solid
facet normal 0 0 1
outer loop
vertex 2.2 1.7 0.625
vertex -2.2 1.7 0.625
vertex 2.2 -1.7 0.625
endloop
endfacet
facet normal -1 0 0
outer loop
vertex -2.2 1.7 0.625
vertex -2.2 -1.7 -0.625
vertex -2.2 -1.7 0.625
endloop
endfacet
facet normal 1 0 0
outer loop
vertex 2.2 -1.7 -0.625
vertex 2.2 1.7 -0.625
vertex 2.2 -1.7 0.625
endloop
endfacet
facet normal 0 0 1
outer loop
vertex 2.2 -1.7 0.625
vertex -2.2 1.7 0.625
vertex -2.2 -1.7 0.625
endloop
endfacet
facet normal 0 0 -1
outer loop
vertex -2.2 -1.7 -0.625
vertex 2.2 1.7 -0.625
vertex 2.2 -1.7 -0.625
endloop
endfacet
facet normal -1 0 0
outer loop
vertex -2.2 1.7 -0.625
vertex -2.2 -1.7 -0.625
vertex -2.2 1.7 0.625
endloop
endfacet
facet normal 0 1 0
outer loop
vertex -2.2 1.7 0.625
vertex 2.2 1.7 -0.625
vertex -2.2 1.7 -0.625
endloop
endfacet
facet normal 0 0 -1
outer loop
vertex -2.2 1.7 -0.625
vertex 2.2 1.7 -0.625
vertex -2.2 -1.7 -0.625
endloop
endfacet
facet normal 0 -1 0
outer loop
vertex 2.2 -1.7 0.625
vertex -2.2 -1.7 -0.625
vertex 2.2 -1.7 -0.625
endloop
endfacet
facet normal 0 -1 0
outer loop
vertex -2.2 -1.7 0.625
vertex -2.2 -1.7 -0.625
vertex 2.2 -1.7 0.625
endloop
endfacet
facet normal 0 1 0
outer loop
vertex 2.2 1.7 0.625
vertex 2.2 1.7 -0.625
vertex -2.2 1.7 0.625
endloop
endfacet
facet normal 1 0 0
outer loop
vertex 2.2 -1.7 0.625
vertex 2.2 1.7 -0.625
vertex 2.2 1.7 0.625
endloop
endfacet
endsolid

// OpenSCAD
$fn = 64;

module smd(size = [4.90, 3.90, 1.25]) {
    eps = 0.01;
    sx = max(size[0], eps);
    sy = max(size[1], eps);
    sz = max(size[2], eps);

    // Slightly chamfered rectangular body to ensure visible edges in renders
    chamfer = min(0.25, sx/6, sy/6, sz/4);

    hull() {
        translate([0, 0,  sz/2 - chamfer/2])
            cube([sx - 2*chamfer, sy - 2*chamfer, chamfer], center=true);
        translate([0, 0, -sz/2 + chamfer/2])
            cube([sx - 2*chamfer, sy - 2*chamfer, chamfer], center=true);
    }
}

smd([4.90, 3.90, 1.25]);
